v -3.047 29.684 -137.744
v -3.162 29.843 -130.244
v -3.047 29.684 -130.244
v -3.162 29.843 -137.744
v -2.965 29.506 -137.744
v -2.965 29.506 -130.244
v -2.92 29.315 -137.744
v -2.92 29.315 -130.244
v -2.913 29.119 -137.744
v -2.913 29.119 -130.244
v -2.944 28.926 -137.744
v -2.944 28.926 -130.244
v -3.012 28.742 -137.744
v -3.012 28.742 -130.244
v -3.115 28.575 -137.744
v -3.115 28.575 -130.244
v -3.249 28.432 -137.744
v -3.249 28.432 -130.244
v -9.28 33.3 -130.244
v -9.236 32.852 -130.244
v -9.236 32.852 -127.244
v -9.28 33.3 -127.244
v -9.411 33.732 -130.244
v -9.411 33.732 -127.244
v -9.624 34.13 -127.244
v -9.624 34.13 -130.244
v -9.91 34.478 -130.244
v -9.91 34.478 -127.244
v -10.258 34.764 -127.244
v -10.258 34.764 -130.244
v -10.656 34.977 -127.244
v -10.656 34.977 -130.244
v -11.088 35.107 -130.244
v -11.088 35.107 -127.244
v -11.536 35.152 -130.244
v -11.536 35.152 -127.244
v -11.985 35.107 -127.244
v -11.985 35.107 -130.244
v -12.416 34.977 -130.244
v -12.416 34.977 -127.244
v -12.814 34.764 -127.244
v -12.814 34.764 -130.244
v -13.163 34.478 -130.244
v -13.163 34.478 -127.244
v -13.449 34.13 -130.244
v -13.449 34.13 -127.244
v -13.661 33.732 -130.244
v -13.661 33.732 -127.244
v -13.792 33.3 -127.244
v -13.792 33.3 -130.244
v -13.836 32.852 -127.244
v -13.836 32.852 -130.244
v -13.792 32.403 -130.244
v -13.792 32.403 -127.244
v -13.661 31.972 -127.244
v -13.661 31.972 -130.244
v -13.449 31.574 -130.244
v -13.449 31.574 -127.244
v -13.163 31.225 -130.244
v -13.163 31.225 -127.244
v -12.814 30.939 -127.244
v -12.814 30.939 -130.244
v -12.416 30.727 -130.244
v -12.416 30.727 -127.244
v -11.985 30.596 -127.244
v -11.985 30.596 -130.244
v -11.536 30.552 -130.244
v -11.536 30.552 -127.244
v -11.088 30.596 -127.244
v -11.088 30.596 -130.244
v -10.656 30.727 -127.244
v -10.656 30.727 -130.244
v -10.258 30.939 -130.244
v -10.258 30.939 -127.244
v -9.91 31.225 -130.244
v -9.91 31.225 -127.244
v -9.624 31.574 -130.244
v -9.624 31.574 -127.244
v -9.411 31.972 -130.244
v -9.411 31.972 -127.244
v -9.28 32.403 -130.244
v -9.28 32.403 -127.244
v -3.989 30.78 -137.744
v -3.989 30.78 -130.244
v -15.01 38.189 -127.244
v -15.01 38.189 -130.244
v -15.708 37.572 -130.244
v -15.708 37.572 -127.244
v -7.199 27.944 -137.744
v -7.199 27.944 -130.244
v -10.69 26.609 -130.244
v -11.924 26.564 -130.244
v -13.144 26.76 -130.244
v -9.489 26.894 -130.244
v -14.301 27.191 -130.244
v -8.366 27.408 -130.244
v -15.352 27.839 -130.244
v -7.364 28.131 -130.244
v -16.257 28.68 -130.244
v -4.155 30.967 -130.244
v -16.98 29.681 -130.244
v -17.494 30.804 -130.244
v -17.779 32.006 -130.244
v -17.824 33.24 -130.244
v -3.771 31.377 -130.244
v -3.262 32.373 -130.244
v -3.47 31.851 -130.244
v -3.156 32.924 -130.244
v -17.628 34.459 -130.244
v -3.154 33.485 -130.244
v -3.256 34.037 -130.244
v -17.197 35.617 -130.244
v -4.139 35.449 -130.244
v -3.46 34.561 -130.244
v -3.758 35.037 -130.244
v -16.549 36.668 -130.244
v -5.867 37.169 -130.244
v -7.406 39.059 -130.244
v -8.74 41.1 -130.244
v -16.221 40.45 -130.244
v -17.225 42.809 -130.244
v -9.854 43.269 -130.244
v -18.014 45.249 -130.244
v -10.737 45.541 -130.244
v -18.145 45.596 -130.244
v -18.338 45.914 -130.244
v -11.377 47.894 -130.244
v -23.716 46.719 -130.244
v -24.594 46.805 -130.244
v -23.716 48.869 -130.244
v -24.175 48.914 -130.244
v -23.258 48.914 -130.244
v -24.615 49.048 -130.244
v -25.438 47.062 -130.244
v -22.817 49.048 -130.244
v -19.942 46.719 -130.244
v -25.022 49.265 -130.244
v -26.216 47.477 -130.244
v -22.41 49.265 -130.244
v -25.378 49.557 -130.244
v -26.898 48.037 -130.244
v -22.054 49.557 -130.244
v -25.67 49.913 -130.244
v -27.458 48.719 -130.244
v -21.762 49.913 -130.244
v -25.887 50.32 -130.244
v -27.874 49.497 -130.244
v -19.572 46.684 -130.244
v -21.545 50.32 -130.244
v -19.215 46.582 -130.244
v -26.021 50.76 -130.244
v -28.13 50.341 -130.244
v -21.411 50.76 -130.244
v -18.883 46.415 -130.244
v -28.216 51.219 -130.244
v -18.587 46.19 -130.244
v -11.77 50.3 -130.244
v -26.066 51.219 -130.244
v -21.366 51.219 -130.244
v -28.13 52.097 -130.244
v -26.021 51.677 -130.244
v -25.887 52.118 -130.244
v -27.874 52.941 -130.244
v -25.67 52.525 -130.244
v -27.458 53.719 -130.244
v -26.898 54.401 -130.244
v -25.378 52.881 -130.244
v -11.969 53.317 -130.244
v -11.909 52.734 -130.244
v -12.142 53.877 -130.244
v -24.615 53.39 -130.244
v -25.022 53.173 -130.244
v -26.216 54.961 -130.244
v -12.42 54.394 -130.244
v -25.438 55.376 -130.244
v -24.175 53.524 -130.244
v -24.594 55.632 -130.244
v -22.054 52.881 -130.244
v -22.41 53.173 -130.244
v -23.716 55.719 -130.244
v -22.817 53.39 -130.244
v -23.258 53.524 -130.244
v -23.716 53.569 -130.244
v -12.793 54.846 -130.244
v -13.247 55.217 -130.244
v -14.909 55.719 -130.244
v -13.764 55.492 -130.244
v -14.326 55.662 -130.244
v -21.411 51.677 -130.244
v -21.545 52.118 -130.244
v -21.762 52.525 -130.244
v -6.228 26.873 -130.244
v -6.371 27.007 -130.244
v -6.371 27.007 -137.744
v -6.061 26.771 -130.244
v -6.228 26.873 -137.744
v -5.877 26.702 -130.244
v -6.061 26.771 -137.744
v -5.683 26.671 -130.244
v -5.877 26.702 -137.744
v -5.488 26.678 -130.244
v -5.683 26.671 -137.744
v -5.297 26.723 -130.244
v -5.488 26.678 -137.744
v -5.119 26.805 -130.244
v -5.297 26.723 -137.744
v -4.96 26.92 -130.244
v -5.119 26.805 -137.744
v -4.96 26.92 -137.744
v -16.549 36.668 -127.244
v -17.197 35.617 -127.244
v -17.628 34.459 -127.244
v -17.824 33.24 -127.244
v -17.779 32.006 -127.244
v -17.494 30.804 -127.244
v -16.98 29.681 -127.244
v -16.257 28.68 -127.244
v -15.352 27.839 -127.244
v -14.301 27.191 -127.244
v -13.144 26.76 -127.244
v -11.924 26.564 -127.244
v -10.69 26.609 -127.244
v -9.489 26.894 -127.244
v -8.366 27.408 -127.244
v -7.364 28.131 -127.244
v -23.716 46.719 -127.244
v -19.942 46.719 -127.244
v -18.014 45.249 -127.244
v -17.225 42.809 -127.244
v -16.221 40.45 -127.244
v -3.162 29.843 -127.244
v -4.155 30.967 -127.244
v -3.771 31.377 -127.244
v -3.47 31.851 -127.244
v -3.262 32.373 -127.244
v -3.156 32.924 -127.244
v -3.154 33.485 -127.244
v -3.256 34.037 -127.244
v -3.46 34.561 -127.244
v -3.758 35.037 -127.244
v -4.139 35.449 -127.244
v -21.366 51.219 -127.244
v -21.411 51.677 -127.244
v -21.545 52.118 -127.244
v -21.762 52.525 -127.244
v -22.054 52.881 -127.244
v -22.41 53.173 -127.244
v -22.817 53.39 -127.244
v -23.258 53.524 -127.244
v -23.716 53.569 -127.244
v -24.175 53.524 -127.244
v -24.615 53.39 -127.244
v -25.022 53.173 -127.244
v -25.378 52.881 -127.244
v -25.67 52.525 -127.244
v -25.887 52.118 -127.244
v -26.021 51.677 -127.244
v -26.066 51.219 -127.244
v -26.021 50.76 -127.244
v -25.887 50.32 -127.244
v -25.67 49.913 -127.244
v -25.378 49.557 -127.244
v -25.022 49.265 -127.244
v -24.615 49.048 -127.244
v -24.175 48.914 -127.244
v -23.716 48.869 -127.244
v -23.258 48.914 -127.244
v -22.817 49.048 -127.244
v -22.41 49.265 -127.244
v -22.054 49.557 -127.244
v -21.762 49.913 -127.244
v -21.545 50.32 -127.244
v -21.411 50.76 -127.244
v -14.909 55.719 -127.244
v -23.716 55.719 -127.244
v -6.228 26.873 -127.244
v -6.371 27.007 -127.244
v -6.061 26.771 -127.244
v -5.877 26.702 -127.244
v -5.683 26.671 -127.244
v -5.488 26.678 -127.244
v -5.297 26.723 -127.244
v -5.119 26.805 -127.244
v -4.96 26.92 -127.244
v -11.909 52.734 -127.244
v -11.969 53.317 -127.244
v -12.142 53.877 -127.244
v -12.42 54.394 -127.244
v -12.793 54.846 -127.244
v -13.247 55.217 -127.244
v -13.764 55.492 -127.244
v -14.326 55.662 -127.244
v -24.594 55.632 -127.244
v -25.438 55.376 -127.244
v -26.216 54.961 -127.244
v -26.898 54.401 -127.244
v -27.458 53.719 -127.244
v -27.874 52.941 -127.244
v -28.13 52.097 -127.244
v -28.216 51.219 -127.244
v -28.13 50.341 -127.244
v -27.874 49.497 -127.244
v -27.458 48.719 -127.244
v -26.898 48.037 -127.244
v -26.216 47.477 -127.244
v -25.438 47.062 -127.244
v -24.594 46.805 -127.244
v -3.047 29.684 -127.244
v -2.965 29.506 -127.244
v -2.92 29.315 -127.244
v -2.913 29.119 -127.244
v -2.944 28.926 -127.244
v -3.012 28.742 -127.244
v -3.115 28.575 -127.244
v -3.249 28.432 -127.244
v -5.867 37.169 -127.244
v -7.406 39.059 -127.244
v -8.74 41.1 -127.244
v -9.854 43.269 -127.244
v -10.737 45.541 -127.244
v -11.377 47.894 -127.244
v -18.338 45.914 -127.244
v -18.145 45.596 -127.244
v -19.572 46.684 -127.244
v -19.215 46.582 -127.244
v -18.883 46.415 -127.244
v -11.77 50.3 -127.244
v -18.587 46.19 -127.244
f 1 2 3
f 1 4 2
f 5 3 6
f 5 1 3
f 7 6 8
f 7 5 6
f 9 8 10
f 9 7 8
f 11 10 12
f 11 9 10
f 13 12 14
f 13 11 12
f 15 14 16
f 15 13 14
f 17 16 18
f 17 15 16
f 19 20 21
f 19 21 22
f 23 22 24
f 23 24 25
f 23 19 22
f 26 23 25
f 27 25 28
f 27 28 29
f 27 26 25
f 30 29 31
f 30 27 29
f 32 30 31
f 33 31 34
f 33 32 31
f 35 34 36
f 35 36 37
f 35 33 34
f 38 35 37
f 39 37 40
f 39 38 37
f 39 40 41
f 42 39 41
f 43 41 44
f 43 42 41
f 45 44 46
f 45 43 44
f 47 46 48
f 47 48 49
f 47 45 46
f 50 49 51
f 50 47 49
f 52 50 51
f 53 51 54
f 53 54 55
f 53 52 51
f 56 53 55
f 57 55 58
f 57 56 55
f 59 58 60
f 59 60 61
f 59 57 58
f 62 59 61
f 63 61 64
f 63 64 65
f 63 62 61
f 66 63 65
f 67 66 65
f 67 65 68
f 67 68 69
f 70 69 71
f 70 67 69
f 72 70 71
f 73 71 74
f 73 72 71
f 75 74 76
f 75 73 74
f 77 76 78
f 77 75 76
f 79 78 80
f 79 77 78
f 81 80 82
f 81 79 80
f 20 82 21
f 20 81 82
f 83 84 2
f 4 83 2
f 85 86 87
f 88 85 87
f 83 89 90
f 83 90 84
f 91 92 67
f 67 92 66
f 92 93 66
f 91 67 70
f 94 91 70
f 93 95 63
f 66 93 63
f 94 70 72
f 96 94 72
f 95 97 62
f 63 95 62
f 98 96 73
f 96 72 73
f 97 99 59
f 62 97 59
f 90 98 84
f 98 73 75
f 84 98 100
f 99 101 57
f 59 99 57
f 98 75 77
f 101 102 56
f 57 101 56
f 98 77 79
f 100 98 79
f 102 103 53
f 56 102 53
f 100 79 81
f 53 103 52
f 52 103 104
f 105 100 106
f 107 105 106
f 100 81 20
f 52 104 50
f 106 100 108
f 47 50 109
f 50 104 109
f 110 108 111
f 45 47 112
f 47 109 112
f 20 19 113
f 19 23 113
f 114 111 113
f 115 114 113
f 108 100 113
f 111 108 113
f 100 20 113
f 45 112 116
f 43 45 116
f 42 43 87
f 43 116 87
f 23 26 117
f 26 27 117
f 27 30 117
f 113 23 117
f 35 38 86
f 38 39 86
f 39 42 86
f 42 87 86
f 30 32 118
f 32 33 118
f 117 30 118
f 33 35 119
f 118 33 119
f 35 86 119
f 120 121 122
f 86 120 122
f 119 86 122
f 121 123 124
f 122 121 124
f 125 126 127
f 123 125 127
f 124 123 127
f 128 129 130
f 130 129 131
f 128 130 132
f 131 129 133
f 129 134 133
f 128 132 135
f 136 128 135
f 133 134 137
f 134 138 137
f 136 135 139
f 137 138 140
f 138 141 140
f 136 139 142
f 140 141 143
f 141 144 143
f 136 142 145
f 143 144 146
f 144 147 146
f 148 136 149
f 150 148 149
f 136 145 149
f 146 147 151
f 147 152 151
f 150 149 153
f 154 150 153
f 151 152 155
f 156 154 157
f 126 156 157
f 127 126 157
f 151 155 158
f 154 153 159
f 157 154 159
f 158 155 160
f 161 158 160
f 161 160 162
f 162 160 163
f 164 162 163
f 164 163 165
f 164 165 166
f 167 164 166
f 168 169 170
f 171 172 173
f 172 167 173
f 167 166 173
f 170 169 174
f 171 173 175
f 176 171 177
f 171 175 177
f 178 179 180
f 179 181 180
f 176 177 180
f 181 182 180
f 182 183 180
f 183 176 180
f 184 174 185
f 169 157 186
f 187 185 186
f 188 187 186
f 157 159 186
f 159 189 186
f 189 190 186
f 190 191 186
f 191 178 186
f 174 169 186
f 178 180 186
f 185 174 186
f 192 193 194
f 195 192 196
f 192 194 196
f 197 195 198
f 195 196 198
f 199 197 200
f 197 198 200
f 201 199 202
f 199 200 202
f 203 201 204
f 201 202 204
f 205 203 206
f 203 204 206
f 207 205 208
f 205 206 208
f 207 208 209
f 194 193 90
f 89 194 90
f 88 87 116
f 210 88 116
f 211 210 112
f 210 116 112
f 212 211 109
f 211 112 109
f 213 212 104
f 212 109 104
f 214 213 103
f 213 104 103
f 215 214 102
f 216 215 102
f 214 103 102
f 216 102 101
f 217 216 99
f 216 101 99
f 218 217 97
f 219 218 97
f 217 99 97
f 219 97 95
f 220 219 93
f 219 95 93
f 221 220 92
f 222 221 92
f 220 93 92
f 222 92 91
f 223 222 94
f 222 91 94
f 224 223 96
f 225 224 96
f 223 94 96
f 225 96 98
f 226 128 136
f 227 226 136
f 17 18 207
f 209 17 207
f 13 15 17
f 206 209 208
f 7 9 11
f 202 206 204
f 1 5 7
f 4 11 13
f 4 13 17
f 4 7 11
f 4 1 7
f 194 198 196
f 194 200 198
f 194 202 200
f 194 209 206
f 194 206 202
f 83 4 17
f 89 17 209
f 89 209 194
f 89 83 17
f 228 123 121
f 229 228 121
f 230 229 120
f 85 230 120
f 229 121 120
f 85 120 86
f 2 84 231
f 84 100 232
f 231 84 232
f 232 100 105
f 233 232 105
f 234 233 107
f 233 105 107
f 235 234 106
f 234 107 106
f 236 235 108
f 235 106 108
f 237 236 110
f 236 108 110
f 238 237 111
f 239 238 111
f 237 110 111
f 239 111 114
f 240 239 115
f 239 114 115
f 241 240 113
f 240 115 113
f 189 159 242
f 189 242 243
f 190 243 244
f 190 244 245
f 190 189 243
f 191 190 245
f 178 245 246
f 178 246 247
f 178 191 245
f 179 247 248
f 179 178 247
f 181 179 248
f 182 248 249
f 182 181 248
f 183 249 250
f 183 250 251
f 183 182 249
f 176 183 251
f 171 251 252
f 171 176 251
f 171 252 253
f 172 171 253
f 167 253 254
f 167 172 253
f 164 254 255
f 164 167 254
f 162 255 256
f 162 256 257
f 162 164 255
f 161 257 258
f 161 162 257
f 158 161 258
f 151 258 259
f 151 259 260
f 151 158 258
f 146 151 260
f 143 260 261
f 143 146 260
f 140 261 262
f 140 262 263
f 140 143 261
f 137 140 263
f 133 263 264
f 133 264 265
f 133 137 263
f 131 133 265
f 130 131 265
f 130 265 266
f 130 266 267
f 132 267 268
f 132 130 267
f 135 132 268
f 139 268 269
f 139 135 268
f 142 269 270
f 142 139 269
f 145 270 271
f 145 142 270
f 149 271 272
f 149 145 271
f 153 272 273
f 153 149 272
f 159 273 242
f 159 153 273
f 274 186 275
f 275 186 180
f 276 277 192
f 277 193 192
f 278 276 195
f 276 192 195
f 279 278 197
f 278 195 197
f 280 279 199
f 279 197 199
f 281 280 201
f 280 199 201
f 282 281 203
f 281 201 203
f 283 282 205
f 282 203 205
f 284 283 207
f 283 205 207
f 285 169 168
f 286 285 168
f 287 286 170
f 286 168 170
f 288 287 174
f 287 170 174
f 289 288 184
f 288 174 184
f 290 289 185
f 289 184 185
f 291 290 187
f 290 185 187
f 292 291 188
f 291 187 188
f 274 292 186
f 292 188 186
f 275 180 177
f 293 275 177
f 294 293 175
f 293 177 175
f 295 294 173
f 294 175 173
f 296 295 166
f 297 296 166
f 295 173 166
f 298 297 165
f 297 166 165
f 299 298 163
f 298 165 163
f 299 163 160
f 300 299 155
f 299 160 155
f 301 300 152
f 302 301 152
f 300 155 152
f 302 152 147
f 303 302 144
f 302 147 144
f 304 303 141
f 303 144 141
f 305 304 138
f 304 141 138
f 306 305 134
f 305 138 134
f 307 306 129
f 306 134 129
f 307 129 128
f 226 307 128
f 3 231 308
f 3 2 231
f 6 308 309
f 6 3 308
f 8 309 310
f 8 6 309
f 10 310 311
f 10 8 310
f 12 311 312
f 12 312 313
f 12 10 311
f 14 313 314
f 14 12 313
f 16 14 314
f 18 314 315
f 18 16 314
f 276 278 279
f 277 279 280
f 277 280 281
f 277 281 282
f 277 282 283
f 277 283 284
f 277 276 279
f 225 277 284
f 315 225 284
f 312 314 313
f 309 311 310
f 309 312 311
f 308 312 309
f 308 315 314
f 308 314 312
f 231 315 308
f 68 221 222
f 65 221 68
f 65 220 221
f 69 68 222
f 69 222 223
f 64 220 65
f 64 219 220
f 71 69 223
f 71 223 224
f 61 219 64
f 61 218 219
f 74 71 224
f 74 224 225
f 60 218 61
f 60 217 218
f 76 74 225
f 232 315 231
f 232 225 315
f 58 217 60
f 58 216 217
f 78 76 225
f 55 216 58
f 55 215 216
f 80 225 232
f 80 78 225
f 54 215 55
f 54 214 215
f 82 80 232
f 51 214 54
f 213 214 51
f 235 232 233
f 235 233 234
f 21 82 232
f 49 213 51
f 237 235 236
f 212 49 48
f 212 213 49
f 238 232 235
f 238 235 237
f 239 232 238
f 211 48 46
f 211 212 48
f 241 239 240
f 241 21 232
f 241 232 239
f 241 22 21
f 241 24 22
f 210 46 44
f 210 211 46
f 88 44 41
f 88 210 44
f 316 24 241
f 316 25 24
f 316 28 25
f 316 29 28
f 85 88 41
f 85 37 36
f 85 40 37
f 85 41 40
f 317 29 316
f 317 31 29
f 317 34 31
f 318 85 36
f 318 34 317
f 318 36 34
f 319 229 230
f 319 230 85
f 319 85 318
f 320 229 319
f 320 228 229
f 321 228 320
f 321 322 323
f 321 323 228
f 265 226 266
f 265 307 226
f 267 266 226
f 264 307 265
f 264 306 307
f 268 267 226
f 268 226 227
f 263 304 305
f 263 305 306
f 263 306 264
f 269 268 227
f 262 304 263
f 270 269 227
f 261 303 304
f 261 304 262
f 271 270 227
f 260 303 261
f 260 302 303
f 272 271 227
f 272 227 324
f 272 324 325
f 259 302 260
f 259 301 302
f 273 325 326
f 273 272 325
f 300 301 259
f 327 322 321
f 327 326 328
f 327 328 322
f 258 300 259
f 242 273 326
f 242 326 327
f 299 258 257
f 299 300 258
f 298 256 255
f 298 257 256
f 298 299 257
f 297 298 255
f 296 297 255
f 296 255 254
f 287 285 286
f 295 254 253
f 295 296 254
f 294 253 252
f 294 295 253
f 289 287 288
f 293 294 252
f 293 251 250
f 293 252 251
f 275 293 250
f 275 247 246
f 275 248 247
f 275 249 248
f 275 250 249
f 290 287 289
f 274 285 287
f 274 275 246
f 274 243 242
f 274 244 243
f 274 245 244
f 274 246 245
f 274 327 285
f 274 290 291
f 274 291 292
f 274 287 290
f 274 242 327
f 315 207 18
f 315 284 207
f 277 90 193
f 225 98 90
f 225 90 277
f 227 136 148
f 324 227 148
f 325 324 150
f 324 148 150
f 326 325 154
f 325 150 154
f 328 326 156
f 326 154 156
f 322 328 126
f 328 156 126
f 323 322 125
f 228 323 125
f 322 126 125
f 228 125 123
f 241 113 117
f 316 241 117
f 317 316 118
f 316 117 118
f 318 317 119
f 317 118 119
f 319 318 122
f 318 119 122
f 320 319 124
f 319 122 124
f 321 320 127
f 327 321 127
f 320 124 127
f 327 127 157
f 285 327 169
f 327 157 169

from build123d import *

# Parameters (mm, degrees)
SKETCH1_R           = 2.35
SKETCH1_R_2         = 2.3
BOSS_EXTRUDE2_DEPTH = 3
SKETCH2_W           = 4.283202477
SKETCH2_H           = 3
BOSS_EXTRUDE3_DEPTH = 2.5
BOSS_EXTRUDE4_DEPTH = 10.5
FILLET1_R           = 1
SKETCH4_W           = 4.283202477
SKETCH4_H           = 7.5
CUT_EXTRUDE1_DEPTH  = 0.25


with BuildPart() as part:
    # Sketch1 → Boss-Extrude2 (new body)
    with BuildSketch(Plane.XY.offset(-130.24387898)):
        with BuildLine():
            Line((-15.010059364, 38.189351968), (-15.708117617, 37.572463316))
            ThreePointArc((-15.708117617, 37.572463316), (-16.257044738, 28.67984396), (-7.364425381, 28.130916839))
            Line((-7.364425381, 28.130916839), (-4.154897186, 30.967244081))
            ThreePointArc((-4.154897186, 30.967244081), (-3.141509811, 33.204488286), (-4.138848078, 35.44893298))
            ThreePointArc((-4.138848078, 35.44893298), (-9.854378586, 43.268649811), (-11.908958835, 52.734058429))
            ThreePointArc((-11.908958835, 52.734058429), (-12.792945326, 54.845611755), (-14.908920841, 55.718960016))
            Line((-14.908920841, 55.718960016), (-23.716053845, 55.718960016))
            ThreePointArc((-23.716053845, 55.718960016), (-28.216053845, 51.218960016), (-23.716053845, 46.718960016))
            Line((-23.716053845, 46.718960016), (-19.942226175, 46.718960016))
            ThreePointArc((-19.942226175, 46.718960016), (-18.729620599, 46.309427783), (-18.013616093, 45.248547734))
            ThreePointArc((-18.013616093, 45.248547734), (-16.74918621, 41.617962479), (-15.010059364, 38.189351968))
        make_face()
        with Locations((-23.716053845, 51.218960016)):
            Circle(SKETCH1_R, mode=Mode.SUBTRACT)
        with Locations((-11.536271499, 32.851690078)):
            Circle(SKETCH1_R_2, mode=Mode.SUBTRACT)
    extrude(amount=BOSS_EXTRUDE2_DEPTH)

    # Sketch2 → Boss-Extrude3 (add)
    with BuildSketch(Plane(origin=(-17.188019546, 19.449601065, 0), x_dir=(0.7493290854811405, 0.6621977964717171, 0), z_dir=(0.6621977964717171, -0.7493290854811405, 0))):
        with Locations((15.251454246, -128.74387898)):
            Rectangle(SKETCH2_W, SKETCH2_H)
    extrude(amount=BOSS_EXTRUDE3_DEPTH)

    # Sketch3 → Boss-Extrude4 (add)
    with BuildSketch(Plane.XY.offset(-127.24387898)):
        Polygon((-7.364425381, 28.130916839), (-4.154897186, 30.967244081), (-2.499402695, 29.093921367), (-5.70893089, 26.257594125), align=None)
    extrude(amount=-BOSS_EXTRUDE4_DEPTH)

    # Fillet1
    fillet1_edges = [part.edges().sort_by_distance(p)[0] for p in [
        (-5.70893089, 26.257594125, -132.49387898),
        (-2.499402695, 29.093921367, -132.49387898),
    ]]
    fillet(fillet1_edges, radius=FILLET1_R)

    # Sketch4 → Cut-Extrude1 (cut)
    with BuildSketch(Plane(origin=(-17.188019546, 19.449601065, 0), x_dir=(0.7493290854811406, 0.6621977964717171, 0), z_dir=(-0.6621977964717171, 0.7493290854811406, 0))):
        with Locations((15.251454246, 133.99387898)):
            Rectangle(SKETCH4_W, SKETCH4_H)
    extrude(amount=-CUT_EXTRUDE1_DEPTH, mode=Mode.SUBTRACT)


solid = part.part
